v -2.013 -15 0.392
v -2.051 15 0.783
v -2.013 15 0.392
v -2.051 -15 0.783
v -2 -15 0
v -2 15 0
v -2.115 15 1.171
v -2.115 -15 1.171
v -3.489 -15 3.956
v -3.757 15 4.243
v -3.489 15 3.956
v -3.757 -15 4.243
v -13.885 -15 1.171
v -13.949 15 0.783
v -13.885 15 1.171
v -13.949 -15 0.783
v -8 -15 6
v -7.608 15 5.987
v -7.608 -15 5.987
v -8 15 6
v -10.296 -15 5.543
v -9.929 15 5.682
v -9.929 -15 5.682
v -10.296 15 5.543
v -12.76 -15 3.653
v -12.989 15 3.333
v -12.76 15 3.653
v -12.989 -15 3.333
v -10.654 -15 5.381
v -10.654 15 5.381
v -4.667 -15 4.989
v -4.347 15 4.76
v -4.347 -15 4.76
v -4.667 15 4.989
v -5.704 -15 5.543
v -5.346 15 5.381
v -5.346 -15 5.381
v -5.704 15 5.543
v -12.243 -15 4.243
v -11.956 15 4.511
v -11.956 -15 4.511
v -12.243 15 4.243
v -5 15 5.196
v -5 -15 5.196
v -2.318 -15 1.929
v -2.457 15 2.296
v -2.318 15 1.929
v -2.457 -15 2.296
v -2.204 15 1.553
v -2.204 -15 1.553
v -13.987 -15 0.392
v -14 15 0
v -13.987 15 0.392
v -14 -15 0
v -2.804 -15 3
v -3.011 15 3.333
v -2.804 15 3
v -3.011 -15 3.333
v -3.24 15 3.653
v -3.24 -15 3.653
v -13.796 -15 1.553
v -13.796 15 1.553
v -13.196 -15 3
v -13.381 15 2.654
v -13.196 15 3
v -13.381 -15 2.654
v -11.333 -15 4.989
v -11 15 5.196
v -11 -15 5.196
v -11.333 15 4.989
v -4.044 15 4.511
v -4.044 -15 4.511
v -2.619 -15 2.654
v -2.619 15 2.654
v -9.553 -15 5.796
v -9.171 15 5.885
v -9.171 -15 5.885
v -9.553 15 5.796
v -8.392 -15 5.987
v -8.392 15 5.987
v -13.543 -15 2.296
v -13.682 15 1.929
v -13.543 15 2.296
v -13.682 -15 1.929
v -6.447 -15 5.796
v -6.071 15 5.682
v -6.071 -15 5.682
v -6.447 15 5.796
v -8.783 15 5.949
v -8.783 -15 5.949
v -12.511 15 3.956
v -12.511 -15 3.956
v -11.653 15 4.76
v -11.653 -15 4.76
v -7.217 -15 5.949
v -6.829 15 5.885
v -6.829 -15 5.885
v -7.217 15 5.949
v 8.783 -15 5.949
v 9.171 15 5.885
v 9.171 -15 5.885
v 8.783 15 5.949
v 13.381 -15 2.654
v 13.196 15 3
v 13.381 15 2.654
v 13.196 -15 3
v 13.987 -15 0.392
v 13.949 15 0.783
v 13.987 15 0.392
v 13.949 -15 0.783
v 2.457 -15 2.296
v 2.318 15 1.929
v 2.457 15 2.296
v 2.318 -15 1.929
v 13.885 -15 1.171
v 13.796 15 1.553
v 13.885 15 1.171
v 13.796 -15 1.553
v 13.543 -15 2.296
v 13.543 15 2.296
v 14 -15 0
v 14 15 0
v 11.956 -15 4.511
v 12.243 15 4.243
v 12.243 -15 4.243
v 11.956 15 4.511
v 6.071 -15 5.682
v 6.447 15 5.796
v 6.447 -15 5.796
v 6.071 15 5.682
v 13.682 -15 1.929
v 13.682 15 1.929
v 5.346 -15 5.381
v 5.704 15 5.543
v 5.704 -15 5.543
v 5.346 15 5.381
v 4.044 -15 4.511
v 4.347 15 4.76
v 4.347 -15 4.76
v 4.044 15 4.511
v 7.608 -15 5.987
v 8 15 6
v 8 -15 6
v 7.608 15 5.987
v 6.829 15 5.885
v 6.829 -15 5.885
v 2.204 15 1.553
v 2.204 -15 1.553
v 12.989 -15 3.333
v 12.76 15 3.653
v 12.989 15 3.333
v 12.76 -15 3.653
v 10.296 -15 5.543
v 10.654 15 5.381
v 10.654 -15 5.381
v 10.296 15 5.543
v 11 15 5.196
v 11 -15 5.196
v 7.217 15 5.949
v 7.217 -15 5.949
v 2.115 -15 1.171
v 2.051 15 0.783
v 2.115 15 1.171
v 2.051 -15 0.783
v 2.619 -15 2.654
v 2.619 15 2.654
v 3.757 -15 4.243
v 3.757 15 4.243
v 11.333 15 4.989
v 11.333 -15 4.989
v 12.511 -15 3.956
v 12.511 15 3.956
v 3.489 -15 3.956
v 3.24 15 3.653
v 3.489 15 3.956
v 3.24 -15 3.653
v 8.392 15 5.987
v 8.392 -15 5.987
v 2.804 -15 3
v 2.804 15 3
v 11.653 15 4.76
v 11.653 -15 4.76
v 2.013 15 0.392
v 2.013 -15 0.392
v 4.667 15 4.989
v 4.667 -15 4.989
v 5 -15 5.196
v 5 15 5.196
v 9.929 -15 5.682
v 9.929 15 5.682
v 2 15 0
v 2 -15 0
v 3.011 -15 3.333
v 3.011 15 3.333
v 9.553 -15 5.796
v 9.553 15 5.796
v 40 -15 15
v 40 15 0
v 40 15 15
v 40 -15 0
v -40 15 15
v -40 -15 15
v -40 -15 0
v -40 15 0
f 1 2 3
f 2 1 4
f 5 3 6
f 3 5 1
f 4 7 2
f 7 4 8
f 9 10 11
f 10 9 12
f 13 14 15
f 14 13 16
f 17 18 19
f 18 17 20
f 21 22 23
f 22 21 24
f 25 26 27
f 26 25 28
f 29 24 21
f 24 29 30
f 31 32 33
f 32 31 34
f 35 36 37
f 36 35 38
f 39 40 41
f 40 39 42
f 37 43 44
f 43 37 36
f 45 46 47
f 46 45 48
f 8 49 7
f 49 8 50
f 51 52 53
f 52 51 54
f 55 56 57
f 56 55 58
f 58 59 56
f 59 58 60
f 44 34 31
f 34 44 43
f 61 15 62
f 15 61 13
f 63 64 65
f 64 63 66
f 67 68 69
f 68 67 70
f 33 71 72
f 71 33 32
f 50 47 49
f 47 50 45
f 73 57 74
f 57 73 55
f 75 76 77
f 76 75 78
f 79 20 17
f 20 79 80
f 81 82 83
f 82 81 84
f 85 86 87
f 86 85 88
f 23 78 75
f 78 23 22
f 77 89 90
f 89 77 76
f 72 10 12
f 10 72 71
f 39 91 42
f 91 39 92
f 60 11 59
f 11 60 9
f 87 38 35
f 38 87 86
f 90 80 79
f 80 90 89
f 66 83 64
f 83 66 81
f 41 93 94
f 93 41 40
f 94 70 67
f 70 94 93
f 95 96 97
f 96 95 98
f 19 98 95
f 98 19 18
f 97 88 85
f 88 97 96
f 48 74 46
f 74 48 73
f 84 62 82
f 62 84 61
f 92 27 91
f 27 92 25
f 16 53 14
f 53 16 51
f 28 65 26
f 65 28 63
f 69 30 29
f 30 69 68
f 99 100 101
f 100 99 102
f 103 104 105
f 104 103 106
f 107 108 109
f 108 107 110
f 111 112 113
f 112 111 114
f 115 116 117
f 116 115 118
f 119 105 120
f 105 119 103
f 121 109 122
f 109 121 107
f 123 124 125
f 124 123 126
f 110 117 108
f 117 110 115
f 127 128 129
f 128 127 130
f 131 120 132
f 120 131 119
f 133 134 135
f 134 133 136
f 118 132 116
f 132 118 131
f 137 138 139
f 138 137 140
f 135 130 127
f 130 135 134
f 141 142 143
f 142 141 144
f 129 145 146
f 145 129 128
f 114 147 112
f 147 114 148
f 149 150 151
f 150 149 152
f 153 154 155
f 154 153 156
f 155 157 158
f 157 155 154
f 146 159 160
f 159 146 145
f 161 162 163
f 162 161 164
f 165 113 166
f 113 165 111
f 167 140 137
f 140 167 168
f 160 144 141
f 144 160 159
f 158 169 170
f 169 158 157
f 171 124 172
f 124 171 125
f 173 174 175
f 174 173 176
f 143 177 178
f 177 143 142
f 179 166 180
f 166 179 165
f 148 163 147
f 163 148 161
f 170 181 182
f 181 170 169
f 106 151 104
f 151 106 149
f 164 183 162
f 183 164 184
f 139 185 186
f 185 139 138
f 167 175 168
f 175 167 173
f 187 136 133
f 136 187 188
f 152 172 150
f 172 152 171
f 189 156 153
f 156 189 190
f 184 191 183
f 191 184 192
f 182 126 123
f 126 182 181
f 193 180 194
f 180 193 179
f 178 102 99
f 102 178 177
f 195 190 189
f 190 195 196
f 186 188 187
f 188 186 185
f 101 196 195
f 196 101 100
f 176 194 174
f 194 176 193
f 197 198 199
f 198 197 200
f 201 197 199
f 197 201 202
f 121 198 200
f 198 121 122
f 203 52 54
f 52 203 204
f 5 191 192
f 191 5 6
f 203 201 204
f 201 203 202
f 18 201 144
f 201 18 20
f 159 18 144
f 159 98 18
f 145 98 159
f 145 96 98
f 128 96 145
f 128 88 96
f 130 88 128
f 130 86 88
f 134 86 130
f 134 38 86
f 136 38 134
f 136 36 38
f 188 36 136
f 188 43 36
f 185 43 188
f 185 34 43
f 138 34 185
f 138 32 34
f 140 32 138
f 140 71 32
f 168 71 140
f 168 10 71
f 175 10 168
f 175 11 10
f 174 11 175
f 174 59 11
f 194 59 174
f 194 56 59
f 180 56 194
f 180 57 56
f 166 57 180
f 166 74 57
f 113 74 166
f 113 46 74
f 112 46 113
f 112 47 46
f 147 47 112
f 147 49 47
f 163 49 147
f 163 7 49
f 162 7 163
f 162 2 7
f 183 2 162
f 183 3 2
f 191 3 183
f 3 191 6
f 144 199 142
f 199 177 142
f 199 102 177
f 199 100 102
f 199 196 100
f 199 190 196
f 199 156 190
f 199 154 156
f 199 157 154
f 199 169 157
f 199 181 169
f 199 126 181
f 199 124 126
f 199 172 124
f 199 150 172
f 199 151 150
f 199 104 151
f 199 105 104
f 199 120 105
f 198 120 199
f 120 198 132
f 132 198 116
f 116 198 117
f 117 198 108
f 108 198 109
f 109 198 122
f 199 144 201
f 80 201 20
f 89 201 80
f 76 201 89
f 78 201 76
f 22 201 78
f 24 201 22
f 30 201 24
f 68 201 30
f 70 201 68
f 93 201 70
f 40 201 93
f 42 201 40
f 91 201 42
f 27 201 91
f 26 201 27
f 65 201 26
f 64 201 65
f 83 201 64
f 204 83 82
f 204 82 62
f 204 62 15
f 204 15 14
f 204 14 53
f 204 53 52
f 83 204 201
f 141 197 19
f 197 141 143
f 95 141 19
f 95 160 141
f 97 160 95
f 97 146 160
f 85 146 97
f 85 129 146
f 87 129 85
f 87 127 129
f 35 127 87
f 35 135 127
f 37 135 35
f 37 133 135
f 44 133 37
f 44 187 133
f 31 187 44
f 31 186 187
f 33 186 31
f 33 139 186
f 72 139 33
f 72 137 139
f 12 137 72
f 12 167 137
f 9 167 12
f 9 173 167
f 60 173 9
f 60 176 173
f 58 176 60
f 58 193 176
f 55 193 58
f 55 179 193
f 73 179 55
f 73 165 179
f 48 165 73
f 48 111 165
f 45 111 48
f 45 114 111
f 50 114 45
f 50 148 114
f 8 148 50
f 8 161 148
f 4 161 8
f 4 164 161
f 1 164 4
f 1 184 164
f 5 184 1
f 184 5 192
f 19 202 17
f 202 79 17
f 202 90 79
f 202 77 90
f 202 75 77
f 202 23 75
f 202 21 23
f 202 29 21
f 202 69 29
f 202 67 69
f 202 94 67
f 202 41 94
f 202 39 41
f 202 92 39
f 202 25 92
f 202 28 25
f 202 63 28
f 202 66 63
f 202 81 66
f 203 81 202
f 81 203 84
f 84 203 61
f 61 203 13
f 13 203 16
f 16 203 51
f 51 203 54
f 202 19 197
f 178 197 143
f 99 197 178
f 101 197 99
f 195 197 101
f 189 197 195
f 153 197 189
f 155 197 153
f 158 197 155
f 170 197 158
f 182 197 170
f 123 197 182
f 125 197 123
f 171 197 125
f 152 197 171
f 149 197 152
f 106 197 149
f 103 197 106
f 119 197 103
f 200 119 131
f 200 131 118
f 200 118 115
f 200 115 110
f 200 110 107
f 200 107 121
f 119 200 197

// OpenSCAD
// Cable bridge - lets cables cross under a bench mat
// Print orientation: flat on bed, tunnels open at floor level

// ---------- Parameters ----------
block_len   = 80;   // block length along X (mm)
block_wid   = 30;   // block width along Y (mm)
block_ht    = 15;   // block height along Z (mm)

tunnel_d    = 12;   // tunnel cylinder diameter (mm)
tunnel_n    = 2;    // number of tunnels
tunnel_pitch = 16;  // centre-to-centre spacing of tunnel axes along X (mm)

eps         = 0.5;  // cutter overshoot past faces (mm)
$fn         = 96;   // facet count for round features

// ---------- Model ----------
difference() {
    // Main block, centred in X/Y, sitting on z = 0
    translate([-block_len/2, -block_wid/2, 0])
        cube([block_len, block_wid, block_ht]);

    // Semicircular tunnels: cylinders with axis along Y at z = 0.
    // The lower half lies below the bed, leaving a half-round channel.
    for (i = [0 : tunnel_n - 1]) {
        x = (i - (tunnel_n - 1) / 2) * tunnel_pitch;
        translate([x, 0, 0])
            rotate([90, 0, 0])
                cylinder(d = tunnel_d, h = block_wid + 2*eps, center = true);
    }
}
